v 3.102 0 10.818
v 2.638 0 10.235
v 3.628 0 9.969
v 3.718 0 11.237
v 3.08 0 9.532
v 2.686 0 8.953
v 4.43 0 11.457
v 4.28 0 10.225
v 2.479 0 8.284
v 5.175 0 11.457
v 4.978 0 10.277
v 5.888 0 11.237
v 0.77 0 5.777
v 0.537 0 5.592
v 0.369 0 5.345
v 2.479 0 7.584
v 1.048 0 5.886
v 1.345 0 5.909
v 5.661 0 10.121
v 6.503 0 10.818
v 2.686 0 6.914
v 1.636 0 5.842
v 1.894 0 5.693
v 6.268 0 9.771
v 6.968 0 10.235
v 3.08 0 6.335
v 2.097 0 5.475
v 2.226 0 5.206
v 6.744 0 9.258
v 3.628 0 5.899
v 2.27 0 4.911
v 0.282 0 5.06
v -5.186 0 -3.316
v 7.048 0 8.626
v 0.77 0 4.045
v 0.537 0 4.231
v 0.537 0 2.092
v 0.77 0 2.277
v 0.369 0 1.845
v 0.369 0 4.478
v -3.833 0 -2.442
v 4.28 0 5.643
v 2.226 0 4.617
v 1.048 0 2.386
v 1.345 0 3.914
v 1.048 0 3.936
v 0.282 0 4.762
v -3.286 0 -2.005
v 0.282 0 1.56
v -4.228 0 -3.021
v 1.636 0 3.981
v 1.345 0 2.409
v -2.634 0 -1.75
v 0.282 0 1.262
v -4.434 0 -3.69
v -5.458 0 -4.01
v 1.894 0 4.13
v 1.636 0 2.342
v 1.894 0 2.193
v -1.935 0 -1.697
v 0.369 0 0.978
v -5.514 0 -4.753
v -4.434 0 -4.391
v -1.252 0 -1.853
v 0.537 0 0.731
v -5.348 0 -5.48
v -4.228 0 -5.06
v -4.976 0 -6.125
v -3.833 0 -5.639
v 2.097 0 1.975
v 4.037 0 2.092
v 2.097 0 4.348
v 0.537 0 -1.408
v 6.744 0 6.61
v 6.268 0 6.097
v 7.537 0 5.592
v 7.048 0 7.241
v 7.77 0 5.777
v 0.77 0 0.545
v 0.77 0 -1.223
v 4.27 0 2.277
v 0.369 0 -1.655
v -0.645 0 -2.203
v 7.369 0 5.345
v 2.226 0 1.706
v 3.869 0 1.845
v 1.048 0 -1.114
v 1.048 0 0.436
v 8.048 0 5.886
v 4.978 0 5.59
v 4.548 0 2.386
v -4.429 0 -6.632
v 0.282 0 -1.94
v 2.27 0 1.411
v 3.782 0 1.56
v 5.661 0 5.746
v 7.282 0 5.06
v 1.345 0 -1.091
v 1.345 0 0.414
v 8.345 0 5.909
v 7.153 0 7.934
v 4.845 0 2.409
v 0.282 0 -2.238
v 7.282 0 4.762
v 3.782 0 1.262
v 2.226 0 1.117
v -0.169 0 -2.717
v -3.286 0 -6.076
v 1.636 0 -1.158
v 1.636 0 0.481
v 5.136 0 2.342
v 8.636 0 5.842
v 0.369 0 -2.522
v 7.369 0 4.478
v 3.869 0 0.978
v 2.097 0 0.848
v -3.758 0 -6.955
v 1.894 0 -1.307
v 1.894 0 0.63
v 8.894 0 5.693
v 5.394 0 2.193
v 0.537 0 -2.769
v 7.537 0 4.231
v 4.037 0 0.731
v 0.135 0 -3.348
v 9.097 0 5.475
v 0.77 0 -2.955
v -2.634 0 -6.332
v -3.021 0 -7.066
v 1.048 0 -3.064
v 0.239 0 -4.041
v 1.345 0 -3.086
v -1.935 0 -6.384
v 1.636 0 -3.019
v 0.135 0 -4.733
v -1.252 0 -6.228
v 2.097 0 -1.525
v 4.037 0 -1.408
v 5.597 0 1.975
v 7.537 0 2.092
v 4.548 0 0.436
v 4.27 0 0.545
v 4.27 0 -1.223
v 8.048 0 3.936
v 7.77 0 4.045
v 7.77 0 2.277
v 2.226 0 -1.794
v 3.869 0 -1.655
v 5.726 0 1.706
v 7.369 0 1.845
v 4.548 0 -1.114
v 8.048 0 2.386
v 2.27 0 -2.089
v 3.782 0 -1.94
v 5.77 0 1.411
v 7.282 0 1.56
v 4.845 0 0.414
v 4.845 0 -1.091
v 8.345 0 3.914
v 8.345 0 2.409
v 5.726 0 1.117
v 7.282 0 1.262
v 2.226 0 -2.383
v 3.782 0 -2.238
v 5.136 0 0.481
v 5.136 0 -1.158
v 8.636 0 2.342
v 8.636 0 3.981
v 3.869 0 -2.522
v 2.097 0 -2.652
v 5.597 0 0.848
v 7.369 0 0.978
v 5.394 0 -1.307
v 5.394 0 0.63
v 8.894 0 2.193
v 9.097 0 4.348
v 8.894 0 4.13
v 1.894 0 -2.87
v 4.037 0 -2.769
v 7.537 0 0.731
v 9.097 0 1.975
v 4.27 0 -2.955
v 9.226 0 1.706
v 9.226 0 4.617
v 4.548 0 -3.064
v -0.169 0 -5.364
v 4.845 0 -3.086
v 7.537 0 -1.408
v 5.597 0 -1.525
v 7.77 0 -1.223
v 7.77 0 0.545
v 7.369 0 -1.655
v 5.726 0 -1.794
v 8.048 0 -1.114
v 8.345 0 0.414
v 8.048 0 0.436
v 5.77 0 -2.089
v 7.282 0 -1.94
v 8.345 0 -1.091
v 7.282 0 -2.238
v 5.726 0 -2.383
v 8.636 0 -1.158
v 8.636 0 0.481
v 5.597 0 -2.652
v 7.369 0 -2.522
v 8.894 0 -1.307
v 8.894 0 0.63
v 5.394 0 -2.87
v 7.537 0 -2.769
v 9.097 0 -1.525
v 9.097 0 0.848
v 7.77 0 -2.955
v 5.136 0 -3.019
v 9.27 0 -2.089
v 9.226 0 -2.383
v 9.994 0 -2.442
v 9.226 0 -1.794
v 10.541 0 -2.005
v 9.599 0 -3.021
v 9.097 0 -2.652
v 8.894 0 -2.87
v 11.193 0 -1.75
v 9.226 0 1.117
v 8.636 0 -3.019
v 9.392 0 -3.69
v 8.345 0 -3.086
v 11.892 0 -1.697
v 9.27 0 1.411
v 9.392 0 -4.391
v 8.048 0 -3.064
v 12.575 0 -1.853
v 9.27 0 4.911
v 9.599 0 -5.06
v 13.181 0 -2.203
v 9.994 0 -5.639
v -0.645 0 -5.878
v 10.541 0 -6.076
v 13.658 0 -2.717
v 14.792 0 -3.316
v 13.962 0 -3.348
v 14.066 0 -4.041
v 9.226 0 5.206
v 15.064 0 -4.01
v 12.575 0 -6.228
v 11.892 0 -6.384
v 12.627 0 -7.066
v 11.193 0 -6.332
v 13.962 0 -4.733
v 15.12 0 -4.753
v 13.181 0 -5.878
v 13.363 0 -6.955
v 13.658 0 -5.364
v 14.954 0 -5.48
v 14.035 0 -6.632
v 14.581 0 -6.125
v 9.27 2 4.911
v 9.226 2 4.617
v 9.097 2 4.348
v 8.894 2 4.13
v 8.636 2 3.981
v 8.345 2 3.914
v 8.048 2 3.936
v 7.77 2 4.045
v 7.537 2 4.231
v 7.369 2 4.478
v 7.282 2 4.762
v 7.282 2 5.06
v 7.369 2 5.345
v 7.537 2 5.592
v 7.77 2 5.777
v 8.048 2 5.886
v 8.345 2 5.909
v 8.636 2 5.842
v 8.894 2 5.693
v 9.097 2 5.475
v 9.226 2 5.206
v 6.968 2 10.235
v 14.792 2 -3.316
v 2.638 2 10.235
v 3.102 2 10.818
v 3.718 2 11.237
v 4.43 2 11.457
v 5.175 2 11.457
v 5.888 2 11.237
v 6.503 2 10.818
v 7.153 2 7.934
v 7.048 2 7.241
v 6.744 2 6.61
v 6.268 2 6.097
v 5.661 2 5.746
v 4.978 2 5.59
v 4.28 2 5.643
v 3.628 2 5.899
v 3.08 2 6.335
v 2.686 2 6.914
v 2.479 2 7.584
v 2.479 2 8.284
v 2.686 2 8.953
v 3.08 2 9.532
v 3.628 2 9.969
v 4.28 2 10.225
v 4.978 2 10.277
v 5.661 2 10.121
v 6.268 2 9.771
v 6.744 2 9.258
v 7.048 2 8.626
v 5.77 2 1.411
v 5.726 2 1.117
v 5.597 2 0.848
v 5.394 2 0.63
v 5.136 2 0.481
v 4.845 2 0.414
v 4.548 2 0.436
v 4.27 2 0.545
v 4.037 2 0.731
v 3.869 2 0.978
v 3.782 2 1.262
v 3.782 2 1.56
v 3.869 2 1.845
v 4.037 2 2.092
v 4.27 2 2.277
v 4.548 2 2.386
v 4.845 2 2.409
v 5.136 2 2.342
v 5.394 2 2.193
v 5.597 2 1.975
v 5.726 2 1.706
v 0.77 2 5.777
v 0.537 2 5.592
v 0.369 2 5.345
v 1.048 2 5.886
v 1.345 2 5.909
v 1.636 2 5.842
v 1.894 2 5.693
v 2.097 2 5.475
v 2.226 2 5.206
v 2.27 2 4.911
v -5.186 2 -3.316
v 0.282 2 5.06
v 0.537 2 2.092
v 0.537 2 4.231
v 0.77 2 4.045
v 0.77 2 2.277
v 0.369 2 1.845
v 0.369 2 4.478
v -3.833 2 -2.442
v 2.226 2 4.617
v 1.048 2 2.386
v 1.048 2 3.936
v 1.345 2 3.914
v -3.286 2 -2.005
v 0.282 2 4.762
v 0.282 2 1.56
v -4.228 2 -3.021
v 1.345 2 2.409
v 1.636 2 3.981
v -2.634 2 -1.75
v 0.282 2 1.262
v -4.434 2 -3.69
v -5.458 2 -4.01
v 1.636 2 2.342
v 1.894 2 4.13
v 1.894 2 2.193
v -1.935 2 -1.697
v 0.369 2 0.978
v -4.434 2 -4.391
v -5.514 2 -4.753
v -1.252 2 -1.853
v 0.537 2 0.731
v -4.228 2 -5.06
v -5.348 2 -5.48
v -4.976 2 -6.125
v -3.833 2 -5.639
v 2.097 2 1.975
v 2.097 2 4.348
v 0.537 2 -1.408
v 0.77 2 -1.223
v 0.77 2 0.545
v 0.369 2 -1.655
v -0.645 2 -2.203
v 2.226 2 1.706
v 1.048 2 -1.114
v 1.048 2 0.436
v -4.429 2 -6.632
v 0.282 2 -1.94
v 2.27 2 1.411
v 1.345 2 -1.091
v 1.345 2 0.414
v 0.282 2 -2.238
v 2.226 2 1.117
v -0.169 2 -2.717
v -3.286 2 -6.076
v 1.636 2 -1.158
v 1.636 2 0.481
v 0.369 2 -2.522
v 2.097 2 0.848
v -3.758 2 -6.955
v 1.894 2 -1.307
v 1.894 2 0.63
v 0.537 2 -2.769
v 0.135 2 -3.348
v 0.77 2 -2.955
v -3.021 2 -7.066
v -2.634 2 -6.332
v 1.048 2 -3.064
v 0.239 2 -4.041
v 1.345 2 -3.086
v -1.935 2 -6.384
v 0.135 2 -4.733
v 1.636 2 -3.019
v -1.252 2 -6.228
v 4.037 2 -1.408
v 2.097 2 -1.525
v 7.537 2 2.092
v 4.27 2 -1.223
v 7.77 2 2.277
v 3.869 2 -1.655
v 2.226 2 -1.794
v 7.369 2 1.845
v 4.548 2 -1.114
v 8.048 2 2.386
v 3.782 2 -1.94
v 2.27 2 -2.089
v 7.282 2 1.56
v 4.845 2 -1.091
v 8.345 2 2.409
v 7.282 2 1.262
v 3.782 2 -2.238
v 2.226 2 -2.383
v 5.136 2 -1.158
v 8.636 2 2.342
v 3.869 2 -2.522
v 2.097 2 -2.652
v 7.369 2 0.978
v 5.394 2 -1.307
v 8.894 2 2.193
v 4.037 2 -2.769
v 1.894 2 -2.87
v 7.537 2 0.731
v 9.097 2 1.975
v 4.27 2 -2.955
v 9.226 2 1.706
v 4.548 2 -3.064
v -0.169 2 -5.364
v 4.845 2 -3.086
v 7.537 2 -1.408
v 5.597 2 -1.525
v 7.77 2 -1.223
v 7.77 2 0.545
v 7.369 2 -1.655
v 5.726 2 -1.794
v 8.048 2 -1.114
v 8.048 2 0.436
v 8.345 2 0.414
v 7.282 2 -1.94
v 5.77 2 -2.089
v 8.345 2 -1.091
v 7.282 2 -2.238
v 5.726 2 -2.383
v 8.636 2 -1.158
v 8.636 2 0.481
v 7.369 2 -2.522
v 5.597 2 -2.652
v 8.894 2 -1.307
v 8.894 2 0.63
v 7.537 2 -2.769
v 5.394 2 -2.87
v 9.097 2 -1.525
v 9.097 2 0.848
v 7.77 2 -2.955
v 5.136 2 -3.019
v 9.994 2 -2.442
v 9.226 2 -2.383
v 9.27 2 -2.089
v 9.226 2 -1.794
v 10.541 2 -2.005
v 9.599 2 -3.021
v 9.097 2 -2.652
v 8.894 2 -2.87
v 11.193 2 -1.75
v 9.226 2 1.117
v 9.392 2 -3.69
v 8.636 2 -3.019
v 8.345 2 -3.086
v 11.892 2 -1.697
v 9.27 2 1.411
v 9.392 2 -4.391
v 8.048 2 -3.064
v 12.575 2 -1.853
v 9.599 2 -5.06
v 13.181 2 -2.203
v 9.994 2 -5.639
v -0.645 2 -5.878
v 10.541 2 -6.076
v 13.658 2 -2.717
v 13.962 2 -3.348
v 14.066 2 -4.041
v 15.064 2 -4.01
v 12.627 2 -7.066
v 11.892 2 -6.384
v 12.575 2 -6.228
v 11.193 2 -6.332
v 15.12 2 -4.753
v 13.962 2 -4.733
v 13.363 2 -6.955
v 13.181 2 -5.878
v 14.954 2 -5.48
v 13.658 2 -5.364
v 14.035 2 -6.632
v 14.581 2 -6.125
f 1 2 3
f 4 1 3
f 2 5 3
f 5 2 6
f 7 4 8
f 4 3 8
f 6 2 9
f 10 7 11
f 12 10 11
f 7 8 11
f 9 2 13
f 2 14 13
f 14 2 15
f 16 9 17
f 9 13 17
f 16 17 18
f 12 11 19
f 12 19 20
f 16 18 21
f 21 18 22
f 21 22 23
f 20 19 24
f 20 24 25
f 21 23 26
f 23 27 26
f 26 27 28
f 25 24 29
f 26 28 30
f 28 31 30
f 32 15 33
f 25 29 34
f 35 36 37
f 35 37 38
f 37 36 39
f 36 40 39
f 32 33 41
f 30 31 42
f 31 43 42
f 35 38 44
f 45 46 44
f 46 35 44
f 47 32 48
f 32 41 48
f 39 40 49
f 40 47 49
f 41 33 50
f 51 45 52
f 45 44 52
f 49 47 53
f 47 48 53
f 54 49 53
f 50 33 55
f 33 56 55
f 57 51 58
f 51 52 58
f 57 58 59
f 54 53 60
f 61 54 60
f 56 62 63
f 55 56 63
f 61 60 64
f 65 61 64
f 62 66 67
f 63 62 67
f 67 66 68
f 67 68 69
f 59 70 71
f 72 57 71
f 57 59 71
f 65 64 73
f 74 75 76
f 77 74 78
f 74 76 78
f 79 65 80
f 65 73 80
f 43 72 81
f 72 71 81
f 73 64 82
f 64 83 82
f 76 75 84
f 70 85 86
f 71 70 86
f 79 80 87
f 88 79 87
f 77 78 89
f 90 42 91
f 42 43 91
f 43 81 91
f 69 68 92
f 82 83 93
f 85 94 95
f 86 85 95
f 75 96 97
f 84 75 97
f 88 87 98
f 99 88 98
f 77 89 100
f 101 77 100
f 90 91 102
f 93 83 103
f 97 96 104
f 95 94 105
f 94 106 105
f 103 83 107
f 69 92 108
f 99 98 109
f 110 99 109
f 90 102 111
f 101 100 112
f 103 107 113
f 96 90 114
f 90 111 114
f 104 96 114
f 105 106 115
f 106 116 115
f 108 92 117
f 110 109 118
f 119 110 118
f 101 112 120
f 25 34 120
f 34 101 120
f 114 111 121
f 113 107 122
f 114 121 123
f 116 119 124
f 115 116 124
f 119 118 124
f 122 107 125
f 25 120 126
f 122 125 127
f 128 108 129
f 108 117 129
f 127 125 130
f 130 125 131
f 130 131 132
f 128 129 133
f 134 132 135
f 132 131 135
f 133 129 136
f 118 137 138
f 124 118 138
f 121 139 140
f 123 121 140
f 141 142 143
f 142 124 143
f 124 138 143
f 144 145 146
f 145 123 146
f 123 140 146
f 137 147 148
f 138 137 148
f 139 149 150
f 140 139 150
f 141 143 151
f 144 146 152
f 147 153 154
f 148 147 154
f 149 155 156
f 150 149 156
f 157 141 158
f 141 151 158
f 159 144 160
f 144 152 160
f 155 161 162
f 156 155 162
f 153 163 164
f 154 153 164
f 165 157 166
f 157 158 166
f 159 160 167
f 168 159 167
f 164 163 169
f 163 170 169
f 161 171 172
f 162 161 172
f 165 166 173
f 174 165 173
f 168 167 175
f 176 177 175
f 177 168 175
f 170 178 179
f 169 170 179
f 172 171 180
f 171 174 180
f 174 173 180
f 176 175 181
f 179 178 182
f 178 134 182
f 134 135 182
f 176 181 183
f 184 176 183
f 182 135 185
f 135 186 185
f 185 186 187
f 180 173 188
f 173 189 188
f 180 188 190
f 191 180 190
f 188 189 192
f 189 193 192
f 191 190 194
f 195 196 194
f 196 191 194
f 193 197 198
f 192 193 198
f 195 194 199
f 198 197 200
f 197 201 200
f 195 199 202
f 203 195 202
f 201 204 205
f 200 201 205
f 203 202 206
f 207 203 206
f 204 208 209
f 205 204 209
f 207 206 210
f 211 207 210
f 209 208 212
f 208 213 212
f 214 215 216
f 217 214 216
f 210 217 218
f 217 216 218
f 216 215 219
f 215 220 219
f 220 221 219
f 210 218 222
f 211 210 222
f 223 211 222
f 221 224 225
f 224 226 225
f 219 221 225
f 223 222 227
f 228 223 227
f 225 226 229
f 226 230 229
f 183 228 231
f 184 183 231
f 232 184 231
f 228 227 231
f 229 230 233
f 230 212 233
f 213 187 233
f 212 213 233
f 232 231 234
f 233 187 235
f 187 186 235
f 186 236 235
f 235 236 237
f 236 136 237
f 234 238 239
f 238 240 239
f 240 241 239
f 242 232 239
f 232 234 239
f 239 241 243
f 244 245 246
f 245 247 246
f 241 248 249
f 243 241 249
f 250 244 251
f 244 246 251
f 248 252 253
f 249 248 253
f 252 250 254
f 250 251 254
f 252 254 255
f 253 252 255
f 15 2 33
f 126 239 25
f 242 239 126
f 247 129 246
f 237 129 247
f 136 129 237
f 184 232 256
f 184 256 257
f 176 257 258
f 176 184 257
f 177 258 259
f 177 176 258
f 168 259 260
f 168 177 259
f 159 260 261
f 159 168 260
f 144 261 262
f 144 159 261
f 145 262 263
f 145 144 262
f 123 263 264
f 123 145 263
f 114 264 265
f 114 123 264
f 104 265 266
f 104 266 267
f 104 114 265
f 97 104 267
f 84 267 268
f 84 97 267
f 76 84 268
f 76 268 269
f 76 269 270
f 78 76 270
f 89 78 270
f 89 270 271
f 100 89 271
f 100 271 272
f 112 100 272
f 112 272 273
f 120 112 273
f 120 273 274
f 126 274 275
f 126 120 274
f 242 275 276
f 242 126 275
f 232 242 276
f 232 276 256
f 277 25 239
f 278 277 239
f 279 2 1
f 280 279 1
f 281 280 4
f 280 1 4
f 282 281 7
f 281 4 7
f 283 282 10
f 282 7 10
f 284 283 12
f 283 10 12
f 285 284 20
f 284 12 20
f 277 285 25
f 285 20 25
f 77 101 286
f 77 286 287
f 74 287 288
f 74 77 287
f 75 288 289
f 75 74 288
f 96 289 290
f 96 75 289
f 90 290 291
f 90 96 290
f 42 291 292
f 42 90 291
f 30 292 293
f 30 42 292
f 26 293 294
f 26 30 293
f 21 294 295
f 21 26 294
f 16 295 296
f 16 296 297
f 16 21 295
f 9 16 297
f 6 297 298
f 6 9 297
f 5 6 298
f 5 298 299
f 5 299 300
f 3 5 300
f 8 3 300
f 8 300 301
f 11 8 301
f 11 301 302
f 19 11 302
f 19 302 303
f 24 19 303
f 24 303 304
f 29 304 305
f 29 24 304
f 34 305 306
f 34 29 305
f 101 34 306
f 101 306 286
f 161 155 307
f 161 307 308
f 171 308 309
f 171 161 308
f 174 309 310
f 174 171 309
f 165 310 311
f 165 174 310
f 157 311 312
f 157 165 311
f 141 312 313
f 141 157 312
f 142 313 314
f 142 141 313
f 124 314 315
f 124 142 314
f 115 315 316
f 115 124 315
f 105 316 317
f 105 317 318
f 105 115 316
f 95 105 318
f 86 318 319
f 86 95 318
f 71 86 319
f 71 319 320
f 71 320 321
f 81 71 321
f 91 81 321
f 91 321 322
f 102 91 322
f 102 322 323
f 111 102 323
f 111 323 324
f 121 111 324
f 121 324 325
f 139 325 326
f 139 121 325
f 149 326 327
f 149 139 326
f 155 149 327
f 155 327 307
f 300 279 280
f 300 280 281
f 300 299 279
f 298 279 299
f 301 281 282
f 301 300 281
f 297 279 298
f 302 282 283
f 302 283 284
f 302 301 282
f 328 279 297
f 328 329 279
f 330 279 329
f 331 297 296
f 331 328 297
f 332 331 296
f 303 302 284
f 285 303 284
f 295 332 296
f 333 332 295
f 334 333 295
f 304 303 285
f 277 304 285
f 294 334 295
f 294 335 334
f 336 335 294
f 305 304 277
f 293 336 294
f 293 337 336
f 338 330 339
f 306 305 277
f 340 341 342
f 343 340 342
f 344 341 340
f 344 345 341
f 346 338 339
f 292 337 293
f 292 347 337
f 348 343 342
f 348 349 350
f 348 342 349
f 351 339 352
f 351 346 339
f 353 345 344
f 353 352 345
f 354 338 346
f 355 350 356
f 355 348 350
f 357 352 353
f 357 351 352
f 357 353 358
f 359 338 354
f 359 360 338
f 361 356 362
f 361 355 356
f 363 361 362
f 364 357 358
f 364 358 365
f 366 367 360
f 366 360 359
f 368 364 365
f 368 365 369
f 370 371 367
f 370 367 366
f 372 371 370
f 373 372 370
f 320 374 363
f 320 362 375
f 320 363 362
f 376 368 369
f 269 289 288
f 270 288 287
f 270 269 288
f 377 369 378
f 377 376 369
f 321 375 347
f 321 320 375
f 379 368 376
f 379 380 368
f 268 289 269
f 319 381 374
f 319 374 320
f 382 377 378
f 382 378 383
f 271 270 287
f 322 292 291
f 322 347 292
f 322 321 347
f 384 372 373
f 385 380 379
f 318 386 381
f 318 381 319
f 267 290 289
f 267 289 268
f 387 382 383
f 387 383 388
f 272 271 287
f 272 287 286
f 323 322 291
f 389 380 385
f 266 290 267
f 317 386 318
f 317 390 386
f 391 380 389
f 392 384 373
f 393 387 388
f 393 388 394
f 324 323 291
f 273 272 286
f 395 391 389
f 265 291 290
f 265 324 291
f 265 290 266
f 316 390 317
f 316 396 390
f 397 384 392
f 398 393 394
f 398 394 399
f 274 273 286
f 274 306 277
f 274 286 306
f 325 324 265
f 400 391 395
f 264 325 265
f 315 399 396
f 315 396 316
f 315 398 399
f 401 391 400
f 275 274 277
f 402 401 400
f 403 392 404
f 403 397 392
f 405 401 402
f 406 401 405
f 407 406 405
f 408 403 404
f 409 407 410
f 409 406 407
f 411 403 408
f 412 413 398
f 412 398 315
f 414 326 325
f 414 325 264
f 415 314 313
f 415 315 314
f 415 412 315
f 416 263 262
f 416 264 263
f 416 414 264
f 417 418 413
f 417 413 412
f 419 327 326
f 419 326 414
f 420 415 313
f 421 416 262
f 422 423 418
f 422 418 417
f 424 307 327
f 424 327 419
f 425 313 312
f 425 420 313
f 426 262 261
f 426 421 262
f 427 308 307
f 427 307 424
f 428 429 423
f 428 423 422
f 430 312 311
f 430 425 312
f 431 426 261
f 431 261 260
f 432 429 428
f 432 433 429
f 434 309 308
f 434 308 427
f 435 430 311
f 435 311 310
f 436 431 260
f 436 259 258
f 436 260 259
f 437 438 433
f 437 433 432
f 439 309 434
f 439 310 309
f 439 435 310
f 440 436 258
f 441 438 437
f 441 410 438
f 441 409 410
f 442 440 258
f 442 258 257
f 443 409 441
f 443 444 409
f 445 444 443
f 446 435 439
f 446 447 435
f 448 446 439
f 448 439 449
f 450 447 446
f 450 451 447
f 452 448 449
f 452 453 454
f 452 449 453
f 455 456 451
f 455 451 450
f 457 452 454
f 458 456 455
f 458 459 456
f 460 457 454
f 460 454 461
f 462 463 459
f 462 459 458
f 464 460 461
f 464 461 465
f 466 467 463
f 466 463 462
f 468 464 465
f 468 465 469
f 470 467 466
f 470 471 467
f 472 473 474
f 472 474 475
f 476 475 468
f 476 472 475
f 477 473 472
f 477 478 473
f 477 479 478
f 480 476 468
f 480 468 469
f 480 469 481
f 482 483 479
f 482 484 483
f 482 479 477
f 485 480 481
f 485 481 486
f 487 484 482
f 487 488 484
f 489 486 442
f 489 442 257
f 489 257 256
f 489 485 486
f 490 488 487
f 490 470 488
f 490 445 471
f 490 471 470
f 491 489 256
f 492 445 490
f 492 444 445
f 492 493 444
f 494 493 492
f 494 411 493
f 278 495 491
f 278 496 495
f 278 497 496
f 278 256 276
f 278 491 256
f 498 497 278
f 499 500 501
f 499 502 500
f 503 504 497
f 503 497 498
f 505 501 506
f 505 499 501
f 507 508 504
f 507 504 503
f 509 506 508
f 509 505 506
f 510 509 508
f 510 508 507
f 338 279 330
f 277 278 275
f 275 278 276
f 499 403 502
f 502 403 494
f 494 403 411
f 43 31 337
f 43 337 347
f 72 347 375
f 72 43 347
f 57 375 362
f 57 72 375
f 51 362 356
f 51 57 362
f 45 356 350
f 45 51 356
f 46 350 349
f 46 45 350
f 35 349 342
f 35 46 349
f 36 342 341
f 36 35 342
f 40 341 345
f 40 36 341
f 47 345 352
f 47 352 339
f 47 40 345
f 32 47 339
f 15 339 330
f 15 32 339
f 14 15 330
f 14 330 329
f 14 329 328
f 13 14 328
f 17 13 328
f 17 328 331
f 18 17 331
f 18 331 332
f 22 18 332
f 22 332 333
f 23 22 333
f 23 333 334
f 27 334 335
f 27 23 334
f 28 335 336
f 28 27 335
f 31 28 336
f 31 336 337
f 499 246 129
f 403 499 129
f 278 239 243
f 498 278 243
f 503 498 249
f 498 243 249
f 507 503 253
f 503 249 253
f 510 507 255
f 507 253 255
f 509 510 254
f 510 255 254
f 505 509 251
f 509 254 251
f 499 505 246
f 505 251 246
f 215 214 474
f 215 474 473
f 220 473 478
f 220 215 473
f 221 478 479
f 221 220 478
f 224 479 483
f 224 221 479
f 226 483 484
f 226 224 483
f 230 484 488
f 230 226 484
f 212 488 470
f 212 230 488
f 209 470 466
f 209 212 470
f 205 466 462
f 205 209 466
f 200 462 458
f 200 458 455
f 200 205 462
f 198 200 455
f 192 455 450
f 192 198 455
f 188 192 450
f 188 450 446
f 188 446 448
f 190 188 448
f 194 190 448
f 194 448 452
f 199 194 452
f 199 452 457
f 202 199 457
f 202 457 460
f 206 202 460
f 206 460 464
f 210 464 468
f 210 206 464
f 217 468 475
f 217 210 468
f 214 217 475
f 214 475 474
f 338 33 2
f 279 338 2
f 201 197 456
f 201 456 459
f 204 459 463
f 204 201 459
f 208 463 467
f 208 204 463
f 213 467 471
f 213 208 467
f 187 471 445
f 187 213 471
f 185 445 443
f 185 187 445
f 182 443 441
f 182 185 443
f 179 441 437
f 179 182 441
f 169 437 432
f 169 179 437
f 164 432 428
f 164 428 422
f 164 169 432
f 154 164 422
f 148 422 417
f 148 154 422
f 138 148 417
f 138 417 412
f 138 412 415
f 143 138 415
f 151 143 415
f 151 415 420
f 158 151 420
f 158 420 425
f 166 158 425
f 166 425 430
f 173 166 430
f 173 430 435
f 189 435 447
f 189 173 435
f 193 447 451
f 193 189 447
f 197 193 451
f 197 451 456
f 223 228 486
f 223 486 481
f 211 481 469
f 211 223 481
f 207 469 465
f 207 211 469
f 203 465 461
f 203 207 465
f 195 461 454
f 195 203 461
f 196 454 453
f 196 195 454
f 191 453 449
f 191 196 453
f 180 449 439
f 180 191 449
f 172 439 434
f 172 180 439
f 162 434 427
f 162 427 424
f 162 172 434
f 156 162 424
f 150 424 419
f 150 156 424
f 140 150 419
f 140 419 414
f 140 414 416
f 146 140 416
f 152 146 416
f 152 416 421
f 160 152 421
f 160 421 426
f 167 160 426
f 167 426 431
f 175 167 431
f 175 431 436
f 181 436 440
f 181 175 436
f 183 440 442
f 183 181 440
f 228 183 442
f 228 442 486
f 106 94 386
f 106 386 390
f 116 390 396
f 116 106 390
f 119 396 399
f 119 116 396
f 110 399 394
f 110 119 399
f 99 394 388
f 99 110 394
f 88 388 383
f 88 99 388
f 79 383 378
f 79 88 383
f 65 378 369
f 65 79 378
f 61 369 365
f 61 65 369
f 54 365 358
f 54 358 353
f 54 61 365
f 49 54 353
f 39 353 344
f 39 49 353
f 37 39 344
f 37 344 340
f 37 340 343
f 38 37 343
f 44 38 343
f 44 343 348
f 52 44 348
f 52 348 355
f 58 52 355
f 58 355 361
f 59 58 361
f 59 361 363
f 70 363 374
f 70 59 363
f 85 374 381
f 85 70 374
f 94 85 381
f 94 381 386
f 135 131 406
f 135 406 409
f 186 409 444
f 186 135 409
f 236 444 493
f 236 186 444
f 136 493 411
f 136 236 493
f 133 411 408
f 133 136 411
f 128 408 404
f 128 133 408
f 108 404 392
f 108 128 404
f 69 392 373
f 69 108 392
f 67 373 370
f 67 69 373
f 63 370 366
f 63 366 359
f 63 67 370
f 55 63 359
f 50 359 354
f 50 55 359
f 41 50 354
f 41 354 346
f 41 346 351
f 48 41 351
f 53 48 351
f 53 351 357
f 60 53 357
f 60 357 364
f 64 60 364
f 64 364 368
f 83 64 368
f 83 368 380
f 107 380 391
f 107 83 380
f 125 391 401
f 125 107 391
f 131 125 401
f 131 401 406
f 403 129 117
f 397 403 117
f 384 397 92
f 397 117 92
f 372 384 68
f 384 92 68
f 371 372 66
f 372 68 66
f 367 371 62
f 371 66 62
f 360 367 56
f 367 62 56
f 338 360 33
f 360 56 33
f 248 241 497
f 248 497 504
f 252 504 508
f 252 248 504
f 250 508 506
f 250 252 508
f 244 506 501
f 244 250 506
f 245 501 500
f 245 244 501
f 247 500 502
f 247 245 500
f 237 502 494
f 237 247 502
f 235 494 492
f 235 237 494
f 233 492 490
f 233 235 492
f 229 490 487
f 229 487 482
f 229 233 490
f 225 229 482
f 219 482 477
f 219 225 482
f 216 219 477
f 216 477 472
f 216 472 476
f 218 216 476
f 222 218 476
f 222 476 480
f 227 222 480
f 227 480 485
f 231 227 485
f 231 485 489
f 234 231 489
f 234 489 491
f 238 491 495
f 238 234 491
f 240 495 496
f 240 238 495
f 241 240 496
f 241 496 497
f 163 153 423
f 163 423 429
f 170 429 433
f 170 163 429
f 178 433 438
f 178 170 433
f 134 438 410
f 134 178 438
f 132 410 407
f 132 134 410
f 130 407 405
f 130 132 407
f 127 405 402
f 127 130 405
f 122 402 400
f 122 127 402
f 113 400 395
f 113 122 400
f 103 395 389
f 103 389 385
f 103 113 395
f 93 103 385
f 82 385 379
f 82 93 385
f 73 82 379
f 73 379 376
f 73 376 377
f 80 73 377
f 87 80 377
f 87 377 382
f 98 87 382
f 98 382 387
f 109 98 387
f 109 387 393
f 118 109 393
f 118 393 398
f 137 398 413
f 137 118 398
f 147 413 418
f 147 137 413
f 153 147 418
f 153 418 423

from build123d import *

# Parameters (mm, degrees)
SKETCH1_R      = 2.35
SKETCH1_R_2    = 1
EXTRUDE1_DEPTH = 2


with BuildPart() as part:
    # Sketch1 → Extrude1 (new body)
    with BuildSketch(Plane(origin=(0, 0, 0), x_dir=(1, 0, 0), z_dir=(0, 1, 0))):
        with BuildLine():
            Line((-5.186041147, 3.316192399), (2.637731834, -10.234979911))
            ThreePointArc((2.637731834, -10.234979911), (4.802795343, -11.484979911), (6.967858853, -10.234979911))
            Line((6.967858853, -10.234979911), (14.791631834, 3.316192399))
            ThreePointArc((14.791631834, 3.316192399), (14.791631834, 5.816192399), (12.626568324, 7.066192399))
            Line((12.626568324, 7.066192399), (-3.020977638, 7.066192399))
            ThreePointArc((-3.020977638, 7.066192399), (-5.186041147, 5.816192399), (-5.186041147, 3.316192399))
        make_face()
        with Locations((-2.110635714, 4.040606244)):
            Circle(SKETCH1_R, mode=Mode.SUBTRACT)
        with Locations((4.802795343, -7.933807601)):
            Circle(SKETCH1_R, mode=Mode.SUBTRACT)
        with Locations((11.7162264, 4.040606244)):
            Circle(SKETCH1_R, mode=Mode.SUBTRACT)
        with Locations((1.270334632, 2.088602105)):
            Circle(SKETCH1_R_2, mode=Mode.SUBTRACT)
        with Locations((4.770334632, 2.088602105)):
            Circle(SKETCH1_R_2, mode=Mode.SUBTRACT)
        with Locations((8.270334632, 2.088602105)):
            Circle(SKETCH1_R_2, mode=Mode.SUBTRACT)
        with Locations((1.270334632, -1.411397895)):
            Circle(SKETCH1_R_2, mode=Mode.SUBTRACT)
        with Locations((4.770334632, -1.411397895)):
            Circle(SKETCH1_R_2, mode=Mode.SUBTRACT)
        with Locations((8.270334632, -1.411397895)):
            Circle(SKETCH1_R_2, mode=Mode.SUBTRACT)
        with Locations((1.270334632, -4.911397895)):
            Circle(SKETCH1_R_2, mode=Mode.SUBTRACT)
        with Locations((8.270334632, -4.911397895)):
            Circle(SKETCH1_R_2, mode=Mode.SUBTRACT)
    extrude(amount=EXTRUDE1_DEPTH)


solid = part.part
